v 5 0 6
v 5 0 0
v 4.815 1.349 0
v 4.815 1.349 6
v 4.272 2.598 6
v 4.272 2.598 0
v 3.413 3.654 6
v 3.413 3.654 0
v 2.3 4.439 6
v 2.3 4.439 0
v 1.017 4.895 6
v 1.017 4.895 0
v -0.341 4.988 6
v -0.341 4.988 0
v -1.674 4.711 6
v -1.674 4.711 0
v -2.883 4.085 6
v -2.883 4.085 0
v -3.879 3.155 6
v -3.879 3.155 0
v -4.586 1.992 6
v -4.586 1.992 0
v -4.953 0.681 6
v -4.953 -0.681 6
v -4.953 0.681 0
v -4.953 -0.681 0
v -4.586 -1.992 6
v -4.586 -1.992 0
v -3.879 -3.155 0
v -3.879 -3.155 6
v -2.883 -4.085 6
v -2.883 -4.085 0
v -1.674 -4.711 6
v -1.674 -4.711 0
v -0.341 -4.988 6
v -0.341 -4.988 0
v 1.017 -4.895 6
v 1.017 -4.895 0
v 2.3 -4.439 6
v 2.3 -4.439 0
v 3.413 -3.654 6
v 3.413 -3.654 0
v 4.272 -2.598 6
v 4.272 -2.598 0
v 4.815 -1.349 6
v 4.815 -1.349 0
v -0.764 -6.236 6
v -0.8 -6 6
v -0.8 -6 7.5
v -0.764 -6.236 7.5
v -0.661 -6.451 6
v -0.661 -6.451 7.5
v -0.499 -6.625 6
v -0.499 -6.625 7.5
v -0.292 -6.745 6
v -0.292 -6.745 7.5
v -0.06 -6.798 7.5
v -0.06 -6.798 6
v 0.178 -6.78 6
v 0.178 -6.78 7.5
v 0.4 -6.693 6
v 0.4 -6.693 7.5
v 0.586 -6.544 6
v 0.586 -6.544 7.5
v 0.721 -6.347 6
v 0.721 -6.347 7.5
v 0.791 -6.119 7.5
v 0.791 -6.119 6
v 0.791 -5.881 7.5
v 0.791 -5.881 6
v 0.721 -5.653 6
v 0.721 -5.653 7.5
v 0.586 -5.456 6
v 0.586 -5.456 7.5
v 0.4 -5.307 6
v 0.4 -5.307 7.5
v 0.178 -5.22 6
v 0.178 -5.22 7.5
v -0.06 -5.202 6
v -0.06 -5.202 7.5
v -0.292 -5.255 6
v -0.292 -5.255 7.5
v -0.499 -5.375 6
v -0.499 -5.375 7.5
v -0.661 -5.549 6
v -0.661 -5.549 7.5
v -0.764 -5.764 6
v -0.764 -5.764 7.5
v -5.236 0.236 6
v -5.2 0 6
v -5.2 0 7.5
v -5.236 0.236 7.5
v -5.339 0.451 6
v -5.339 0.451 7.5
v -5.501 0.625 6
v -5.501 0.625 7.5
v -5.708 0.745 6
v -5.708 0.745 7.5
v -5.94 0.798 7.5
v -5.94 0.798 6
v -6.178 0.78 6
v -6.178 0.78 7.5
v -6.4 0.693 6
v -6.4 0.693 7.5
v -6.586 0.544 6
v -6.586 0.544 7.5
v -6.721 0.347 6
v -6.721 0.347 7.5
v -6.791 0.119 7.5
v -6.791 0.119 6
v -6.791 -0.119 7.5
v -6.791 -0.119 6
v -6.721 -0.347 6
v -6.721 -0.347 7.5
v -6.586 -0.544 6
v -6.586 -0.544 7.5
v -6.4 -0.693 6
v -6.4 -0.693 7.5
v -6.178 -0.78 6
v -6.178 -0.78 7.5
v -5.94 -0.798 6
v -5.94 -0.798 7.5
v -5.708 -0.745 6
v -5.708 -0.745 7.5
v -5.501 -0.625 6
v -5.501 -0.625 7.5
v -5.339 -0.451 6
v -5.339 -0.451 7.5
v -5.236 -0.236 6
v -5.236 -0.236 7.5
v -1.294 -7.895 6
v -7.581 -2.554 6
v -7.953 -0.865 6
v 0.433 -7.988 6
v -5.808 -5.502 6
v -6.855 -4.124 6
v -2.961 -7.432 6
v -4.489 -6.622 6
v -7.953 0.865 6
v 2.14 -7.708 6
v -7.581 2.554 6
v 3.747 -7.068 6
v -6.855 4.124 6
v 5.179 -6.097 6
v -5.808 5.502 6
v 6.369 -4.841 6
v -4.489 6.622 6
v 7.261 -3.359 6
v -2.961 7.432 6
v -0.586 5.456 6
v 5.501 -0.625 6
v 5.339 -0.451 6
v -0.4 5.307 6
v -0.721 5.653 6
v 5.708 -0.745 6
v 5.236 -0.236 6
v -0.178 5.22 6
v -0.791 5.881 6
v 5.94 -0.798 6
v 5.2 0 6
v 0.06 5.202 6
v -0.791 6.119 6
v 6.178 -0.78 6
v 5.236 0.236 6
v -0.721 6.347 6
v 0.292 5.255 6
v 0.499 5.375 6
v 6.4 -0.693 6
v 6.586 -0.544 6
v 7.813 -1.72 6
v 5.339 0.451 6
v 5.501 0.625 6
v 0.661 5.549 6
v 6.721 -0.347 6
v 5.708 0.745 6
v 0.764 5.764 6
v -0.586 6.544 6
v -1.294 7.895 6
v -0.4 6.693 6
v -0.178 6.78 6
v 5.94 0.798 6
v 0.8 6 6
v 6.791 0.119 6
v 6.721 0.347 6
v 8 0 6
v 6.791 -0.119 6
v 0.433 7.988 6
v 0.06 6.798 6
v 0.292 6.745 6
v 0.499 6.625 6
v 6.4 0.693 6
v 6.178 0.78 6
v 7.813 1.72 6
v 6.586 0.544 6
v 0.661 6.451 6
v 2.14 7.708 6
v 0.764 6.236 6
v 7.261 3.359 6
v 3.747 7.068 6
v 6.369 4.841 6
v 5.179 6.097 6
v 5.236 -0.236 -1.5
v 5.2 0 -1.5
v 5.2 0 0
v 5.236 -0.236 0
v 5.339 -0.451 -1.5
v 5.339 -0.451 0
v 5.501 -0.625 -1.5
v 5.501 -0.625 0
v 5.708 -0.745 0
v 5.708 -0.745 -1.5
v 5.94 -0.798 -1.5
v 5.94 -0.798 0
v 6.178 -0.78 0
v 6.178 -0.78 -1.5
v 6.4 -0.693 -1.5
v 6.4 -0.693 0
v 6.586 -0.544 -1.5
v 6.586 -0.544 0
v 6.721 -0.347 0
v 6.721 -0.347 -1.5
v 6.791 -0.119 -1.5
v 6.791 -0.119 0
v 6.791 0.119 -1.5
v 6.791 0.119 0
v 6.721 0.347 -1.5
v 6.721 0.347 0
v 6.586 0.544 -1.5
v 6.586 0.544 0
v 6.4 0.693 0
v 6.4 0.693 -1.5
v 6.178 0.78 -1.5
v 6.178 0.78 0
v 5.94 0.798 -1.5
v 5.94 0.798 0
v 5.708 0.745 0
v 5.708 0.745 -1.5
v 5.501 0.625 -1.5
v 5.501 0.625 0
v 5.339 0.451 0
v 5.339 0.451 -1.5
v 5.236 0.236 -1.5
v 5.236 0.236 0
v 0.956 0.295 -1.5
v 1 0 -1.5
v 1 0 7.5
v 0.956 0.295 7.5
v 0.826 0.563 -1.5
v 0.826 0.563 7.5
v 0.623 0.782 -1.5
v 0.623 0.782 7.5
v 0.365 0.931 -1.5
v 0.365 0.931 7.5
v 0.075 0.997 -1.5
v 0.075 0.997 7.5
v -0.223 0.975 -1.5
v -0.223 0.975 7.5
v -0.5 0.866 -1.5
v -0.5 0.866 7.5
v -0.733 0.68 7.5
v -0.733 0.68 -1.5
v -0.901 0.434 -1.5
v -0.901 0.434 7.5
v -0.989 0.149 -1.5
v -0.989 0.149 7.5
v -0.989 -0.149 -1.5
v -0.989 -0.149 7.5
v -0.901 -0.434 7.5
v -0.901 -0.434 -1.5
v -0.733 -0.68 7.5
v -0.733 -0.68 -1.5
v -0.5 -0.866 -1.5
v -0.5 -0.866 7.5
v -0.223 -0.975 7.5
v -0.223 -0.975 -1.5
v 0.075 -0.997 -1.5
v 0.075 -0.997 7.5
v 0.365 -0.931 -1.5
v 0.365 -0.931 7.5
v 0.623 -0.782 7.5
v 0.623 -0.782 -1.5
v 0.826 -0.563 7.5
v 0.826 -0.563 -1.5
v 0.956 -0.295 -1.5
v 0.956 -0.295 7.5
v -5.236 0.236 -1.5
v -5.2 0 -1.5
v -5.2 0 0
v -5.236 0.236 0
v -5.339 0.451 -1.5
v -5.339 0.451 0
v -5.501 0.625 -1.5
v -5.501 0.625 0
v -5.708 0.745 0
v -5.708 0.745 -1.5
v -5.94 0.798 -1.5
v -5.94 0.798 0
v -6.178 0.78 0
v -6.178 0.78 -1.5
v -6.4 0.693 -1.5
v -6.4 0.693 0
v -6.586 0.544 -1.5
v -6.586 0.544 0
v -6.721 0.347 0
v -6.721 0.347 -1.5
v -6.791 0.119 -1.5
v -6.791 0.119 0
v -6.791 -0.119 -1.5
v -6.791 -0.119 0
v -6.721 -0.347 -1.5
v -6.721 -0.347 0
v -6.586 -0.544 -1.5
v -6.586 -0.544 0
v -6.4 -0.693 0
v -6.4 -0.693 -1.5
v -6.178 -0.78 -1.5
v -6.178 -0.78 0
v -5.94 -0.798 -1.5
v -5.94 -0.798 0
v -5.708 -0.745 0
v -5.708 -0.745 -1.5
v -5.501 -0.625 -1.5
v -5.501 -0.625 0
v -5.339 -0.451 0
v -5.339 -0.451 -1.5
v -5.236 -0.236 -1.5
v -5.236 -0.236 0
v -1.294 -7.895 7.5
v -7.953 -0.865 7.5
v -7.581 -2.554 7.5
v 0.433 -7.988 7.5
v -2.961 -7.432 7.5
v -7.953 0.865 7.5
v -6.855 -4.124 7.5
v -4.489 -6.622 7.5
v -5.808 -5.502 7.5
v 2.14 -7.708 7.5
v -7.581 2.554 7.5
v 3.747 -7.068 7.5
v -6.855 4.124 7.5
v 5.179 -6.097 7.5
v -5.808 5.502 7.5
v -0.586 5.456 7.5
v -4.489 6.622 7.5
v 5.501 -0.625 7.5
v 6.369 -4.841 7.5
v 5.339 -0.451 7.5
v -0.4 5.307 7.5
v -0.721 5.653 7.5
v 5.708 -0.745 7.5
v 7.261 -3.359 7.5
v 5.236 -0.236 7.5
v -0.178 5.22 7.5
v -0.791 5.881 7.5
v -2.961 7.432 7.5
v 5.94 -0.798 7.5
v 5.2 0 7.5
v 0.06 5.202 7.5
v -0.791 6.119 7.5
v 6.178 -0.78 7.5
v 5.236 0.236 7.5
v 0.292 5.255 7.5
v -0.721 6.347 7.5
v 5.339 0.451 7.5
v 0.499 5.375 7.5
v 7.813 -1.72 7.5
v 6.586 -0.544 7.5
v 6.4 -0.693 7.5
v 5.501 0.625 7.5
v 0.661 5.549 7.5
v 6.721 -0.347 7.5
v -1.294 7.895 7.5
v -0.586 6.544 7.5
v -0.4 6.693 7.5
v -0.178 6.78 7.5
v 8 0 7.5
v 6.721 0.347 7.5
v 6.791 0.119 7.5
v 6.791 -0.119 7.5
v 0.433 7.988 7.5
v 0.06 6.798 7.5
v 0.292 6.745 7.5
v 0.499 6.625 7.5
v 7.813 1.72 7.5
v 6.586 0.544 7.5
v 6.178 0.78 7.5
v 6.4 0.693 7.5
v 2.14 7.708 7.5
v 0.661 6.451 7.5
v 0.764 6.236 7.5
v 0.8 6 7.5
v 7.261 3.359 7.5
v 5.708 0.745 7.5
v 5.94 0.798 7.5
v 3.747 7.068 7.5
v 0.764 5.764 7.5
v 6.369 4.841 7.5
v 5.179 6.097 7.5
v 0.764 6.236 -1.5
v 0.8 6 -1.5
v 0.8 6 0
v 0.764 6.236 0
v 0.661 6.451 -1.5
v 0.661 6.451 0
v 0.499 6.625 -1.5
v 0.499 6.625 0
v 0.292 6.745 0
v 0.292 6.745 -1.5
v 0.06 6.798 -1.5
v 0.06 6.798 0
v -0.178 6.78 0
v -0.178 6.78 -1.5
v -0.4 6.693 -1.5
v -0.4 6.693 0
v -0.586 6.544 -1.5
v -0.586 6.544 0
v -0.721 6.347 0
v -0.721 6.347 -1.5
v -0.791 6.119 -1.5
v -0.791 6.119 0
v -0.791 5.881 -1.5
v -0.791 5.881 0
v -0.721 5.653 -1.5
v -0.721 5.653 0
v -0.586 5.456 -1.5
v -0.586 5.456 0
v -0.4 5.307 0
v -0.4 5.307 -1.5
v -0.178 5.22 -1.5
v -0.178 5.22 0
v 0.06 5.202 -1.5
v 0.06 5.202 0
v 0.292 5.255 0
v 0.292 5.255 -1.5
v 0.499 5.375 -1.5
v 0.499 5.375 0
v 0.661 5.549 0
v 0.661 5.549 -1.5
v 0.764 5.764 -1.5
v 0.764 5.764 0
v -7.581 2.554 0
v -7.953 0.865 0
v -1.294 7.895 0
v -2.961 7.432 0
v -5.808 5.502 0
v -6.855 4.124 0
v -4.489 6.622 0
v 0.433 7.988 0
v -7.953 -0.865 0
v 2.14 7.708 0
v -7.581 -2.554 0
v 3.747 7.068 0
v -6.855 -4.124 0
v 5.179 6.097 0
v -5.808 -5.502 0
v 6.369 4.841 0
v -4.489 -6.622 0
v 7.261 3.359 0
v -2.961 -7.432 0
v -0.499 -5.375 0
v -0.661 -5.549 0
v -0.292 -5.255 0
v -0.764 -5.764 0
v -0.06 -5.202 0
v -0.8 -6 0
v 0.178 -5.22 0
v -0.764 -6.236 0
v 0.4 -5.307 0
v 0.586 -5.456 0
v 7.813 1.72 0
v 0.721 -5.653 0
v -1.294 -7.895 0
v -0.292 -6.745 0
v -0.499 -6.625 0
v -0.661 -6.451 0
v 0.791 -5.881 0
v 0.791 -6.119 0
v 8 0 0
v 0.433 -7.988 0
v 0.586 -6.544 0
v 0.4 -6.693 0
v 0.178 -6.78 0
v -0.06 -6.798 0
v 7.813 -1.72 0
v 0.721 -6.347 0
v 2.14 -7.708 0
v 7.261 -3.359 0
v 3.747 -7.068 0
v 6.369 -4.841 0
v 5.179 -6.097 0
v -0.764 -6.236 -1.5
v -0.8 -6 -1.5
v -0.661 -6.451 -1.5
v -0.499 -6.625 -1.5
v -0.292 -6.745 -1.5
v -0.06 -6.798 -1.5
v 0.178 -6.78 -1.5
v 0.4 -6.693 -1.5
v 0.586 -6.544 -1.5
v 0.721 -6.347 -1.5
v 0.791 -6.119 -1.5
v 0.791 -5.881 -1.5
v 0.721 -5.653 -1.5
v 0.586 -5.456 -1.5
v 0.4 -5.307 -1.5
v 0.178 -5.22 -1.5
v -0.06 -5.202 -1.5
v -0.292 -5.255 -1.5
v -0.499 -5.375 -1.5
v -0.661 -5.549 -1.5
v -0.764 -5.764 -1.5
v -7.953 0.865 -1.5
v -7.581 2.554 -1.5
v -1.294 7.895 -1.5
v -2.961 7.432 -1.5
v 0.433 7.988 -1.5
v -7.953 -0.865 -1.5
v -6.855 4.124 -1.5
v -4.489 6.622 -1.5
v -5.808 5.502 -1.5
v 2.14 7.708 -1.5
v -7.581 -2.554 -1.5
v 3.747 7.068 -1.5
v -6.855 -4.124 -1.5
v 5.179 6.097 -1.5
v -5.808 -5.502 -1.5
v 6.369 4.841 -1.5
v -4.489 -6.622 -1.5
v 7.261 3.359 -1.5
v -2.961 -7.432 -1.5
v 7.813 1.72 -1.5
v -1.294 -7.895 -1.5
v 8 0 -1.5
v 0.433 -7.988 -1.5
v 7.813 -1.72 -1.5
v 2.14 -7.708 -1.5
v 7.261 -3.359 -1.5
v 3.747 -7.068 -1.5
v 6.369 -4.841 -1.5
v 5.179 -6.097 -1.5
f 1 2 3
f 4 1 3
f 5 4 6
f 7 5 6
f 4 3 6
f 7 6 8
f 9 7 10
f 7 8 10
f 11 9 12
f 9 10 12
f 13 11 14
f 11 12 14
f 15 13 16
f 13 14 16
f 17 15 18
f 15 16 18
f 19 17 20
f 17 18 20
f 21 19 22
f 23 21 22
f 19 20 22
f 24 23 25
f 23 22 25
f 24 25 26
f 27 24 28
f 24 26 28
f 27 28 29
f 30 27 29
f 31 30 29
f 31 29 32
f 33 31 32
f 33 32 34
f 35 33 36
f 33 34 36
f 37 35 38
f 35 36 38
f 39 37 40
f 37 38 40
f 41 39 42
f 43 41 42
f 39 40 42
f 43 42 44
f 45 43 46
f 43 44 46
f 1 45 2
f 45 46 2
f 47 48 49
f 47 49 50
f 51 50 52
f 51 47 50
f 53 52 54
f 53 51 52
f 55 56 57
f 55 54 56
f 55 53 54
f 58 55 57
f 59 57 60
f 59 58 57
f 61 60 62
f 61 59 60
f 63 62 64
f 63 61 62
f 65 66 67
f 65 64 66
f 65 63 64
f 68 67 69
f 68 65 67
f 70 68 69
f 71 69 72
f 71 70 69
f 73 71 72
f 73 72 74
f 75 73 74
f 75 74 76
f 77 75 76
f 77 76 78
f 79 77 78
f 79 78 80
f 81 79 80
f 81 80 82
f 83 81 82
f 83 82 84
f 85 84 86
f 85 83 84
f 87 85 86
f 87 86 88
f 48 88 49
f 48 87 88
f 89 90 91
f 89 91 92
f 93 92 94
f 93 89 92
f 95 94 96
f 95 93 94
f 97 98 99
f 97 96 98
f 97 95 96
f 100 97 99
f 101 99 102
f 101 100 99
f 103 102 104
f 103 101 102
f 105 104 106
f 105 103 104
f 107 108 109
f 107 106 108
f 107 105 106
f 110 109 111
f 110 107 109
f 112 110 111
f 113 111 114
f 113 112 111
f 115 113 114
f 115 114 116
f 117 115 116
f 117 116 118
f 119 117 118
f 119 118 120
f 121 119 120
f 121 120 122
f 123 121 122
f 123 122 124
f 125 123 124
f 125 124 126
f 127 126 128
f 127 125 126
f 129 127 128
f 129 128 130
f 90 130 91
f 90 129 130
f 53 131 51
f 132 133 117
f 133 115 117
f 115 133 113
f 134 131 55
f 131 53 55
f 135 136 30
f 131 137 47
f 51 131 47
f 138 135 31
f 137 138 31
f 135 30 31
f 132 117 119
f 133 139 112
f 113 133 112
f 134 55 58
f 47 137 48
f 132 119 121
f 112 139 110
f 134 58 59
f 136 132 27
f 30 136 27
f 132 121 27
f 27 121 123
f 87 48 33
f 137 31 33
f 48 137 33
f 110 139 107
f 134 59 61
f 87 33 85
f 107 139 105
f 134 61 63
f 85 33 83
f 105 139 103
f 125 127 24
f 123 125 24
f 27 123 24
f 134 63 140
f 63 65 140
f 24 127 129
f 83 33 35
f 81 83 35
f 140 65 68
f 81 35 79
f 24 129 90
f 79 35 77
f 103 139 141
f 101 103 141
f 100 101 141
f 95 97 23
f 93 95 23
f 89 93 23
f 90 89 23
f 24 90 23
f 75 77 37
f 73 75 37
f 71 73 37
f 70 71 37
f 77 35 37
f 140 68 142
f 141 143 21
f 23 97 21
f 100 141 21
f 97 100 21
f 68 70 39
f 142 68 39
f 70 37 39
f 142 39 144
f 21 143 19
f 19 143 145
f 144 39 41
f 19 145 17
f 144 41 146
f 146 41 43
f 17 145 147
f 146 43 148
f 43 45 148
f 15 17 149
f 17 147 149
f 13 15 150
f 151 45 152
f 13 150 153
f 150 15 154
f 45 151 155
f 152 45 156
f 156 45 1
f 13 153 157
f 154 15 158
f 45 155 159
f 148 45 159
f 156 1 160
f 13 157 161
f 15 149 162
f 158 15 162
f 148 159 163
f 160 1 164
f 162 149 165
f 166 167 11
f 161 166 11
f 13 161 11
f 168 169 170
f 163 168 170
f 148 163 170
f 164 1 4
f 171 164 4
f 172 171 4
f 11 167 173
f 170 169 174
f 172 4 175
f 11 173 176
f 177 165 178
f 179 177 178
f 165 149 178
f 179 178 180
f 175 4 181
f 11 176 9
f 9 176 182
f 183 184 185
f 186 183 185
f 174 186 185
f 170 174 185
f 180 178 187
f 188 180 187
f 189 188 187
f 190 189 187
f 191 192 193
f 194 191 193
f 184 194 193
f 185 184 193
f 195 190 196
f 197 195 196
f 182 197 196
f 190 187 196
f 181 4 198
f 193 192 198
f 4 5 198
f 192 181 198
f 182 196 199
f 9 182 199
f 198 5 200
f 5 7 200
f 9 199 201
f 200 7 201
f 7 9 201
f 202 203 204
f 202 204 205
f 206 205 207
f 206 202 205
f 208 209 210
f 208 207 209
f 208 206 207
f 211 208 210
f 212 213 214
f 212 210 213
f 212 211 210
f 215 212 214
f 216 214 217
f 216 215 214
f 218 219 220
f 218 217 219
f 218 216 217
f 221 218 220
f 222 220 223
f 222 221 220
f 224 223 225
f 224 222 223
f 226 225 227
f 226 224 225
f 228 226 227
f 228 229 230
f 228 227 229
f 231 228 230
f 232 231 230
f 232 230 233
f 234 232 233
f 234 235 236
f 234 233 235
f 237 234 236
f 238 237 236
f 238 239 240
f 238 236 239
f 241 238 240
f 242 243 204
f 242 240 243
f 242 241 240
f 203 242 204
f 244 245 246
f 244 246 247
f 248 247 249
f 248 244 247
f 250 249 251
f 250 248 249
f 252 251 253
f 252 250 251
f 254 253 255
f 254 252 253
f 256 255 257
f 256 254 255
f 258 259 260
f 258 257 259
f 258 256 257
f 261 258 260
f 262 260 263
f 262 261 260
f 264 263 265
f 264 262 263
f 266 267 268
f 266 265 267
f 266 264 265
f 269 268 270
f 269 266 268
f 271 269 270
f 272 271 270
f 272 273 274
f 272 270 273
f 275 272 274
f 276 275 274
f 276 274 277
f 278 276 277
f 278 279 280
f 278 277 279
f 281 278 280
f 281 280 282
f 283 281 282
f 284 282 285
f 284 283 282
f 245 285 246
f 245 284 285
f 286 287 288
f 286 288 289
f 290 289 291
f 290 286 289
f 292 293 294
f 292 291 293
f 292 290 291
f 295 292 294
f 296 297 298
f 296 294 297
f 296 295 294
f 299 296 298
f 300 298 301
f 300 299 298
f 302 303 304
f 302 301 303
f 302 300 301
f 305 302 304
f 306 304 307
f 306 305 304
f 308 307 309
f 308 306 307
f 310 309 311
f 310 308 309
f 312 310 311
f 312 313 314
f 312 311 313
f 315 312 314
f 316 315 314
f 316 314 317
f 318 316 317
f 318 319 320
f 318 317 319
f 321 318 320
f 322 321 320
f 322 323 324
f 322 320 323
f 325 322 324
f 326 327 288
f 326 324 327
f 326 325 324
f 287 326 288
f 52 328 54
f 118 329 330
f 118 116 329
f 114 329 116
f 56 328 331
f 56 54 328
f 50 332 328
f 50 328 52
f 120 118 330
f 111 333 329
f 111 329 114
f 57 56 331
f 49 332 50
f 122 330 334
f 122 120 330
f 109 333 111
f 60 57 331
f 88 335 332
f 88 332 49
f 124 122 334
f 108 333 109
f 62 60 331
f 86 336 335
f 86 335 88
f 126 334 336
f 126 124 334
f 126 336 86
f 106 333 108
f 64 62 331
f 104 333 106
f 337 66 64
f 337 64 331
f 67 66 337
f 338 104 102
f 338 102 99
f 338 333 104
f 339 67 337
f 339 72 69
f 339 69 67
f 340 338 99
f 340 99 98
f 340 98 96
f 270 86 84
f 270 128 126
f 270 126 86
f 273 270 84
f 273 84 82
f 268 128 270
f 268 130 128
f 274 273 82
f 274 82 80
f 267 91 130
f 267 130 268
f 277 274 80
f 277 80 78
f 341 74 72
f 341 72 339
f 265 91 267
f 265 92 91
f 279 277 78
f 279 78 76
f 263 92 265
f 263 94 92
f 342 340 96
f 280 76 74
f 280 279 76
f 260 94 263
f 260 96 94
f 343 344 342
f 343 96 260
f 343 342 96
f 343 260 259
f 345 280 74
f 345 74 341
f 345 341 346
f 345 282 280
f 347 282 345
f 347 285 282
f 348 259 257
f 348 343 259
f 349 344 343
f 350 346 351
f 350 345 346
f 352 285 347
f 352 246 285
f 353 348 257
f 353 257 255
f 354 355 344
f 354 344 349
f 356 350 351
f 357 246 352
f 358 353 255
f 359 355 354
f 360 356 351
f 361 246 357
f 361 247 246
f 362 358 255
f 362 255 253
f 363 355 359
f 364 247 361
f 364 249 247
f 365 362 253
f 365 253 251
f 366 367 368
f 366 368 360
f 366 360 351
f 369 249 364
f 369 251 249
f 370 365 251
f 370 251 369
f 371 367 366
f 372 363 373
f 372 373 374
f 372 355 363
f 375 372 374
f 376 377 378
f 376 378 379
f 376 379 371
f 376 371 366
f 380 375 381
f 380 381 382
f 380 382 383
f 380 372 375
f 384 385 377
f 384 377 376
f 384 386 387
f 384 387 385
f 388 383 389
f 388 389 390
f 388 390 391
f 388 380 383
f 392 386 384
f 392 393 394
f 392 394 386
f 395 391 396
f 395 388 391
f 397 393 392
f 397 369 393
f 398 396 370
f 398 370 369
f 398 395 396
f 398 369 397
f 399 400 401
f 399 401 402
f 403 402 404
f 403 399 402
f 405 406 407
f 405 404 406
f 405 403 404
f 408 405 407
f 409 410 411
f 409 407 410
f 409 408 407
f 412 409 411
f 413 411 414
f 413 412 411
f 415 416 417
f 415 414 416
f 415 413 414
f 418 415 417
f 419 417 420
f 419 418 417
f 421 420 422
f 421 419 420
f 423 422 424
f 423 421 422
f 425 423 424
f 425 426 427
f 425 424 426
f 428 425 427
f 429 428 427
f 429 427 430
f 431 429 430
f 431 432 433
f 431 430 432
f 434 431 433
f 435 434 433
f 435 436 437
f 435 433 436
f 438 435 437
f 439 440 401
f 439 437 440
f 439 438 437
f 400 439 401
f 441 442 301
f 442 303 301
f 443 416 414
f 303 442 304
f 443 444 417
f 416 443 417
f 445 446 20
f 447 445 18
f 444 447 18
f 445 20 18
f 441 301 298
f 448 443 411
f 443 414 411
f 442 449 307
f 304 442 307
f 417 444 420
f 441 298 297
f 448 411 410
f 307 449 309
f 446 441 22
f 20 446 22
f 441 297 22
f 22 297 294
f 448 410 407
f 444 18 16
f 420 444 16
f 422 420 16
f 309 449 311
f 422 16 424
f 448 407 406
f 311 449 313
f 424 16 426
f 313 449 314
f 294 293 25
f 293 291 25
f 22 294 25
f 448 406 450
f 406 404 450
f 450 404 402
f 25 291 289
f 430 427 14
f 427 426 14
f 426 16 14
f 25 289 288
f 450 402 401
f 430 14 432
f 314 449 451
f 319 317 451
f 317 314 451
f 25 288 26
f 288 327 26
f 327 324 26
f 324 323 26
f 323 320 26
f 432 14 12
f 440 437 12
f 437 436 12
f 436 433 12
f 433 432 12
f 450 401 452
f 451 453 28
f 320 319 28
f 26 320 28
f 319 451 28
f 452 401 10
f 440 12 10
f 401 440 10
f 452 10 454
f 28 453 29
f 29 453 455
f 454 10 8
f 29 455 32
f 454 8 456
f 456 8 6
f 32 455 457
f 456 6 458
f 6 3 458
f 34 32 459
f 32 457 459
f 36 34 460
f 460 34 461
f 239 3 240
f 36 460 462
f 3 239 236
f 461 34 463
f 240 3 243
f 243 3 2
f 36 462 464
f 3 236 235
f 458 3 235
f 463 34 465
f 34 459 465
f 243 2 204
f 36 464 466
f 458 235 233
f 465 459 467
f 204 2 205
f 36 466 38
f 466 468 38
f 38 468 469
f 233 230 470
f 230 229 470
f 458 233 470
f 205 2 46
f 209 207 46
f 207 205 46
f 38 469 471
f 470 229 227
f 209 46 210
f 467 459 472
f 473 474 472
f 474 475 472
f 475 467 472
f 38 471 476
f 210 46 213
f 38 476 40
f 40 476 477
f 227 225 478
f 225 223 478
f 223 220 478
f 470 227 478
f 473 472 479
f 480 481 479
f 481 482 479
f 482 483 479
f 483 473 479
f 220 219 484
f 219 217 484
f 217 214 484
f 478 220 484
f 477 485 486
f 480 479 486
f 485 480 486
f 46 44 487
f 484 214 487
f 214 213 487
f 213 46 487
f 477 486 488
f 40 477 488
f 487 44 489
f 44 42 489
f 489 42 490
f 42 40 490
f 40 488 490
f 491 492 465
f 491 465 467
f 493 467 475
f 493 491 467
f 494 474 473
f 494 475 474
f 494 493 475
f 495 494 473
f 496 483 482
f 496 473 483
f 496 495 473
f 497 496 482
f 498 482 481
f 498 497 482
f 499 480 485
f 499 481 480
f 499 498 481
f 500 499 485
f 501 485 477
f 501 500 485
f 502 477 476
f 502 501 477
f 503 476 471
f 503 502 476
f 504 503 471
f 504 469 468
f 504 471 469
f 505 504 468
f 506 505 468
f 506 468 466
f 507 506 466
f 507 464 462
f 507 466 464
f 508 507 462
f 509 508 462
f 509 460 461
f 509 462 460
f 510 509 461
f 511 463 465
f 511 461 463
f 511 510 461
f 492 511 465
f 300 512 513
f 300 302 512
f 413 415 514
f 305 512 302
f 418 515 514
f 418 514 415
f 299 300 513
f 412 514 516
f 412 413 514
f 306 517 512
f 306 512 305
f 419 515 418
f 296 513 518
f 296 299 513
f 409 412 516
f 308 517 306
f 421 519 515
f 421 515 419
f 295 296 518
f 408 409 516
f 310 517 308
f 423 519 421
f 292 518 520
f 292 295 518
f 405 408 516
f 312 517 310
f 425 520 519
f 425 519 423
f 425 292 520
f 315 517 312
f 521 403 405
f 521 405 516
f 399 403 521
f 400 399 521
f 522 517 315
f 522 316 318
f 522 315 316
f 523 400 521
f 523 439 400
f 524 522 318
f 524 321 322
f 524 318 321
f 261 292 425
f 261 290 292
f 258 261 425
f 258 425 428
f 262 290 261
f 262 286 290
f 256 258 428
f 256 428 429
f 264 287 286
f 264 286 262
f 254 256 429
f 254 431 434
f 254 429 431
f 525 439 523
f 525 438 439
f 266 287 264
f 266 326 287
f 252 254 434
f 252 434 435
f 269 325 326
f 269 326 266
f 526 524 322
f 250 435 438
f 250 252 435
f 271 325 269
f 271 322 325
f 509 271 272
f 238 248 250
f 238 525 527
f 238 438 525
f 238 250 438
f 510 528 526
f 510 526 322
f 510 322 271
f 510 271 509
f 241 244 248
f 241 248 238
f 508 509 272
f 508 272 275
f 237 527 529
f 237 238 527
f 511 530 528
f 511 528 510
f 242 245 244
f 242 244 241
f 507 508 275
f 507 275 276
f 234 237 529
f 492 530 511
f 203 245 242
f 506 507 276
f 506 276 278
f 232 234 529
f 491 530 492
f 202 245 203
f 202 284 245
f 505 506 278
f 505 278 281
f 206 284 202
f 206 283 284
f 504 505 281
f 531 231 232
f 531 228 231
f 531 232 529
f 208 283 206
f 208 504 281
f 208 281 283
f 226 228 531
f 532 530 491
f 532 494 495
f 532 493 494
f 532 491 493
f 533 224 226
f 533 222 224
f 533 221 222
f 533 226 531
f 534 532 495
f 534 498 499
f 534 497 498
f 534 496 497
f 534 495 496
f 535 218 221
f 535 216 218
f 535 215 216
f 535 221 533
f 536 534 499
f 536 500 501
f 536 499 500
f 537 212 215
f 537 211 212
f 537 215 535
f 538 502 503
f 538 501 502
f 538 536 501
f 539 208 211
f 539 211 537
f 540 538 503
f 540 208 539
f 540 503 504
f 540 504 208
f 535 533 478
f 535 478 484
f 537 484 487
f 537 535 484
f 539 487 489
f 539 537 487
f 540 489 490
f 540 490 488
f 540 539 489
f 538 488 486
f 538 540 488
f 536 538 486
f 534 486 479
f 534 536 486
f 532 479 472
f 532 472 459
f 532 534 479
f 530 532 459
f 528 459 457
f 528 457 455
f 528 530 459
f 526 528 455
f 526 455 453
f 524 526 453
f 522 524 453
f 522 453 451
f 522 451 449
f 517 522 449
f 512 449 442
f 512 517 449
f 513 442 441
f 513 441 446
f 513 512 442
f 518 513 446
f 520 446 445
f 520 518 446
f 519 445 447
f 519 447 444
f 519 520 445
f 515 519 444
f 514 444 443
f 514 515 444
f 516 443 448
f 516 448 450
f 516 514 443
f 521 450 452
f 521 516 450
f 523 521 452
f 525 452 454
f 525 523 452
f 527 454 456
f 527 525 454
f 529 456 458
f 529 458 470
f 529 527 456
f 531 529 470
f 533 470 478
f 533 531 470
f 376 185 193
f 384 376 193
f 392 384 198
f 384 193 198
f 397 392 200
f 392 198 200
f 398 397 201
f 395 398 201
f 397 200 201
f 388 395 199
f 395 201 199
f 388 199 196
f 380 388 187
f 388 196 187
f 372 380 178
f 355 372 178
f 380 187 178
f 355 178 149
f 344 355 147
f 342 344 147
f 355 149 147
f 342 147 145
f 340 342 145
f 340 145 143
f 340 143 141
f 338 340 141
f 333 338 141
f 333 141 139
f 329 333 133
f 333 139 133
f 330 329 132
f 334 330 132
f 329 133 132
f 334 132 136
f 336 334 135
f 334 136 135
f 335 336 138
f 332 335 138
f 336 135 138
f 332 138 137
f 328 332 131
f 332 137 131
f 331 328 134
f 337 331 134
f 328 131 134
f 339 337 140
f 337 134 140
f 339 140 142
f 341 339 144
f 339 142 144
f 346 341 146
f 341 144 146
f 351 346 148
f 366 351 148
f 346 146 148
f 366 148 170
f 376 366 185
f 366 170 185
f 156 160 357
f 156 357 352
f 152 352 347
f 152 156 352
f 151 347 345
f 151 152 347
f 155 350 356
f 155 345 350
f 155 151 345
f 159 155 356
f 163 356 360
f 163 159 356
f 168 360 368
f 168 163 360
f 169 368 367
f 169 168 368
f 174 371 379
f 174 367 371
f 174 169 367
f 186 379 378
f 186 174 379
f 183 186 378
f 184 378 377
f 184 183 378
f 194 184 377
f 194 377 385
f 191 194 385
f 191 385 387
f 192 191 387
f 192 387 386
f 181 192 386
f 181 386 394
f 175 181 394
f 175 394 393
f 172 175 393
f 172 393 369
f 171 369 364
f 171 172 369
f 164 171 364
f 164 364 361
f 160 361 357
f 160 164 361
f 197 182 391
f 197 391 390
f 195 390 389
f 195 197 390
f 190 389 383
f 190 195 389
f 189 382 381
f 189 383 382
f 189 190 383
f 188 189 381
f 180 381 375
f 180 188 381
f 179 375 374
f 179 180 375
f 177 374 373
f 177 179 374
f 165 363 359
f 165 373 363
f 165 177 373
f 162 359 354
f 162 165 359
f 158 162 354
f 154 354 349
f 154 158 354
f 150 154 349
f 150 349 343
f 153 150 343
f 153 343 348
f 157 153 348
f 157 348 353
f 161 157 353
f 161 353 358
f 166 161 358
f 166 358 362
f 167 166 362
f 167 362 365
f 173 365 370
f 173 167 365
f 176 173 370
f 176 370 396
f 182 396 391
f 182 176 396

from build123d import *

# Parameters (mm, degrees)
SKETCH1_R               = 5
BOSS_EXTRUDE1_DEPTH     = 6
SKETCH2_R               = 8
BOSS_EXTRUDE2_DEPTH     = 1.5
BOSS_EXTRUDE3_START     = 1.5
SKETCH3_R               = 8
BOSS_EXTRUDE3_DEPTH     = 1.5
CUT_EXTRUDE1_DEPTH      = 15.456832295
CUT_EXTRUDE1_DEPTH_BACK = 15.456832295
SKETCH4_R               = 0.8
CUT_EXTRUDE2_DEPTH      = 15.456832295
CUT_EXTRUDE2_DEPTH_BACK = 15.456832295
SKETCH5_R               = 1


with BuildPart() as part:
    # Sketch1 → Boss-Extrude1 (new body)
    with BuildSketch(Plane.XY):
        Circle(SKETCH1_R)
    extrude(amount=BOSS_EXTRUDE1_DEPTH)

    # Sketch2 → Boss-Extrude2 (add)
    with BuildSketch(Plane.XY.offset(6)):
        Circle(SKETCH2_R)
    extrude(amount=BOSS_EXTRUDE2_DEPTH)

    # Sketch3 → Boss-Extrude3 (add)
    with BuildSketch(Plane(origin=(0, 0, 0), x_dir=(-1, 0, 0), z_dir=(0, 0, -1)).offset(BOSS_EXTRUDE3_START)):
        Circle(SKETCH3_R)
    extrude(amount=-BOSS_EXTRUDE3_DEPTH)

    # Sketch4 → Cut-Extrude1 (cut, two sides: drawn at the far end of the back side and taken through both)
    with BuildSketch(Plane.XY.offset(7.5).offset(-CUT_EXTRUDE1_DEPTH_BACK)):
        with Locations((-6, 0)):
            Circle(SKETCH4_R)
        with Locations((6, 0)):
            Circle(SKETCH4_R)
        with Locations((0, 6)):
            Circle(SKETCH4_R)
        with Locations((0, -6)):
            Circle(SKETCH4_R)
    extrude(amount=CUT_EXTRUDE1_DEPTH + CUT_EXTRUDE1_DEPTH_BACK, mode=Mode.SUBTRACT)

    # Sketch5 → Cut-Extrude2 (cut, two sides: drawn at the far end of the back side and taken through both)
    with BuildSketch(Plane.XY.offset(7.5).offset(-CUT_EXTRUDE2_DEPTH_BACK)):
        Circle(SKETCH5_R)
    extrude(amount=CUT_EXTRUDE2_DEPTH + CUT_EXTRUDE2_DEPTH_BACK, mode=Mode.SUBTRACT)


solid = part.part
